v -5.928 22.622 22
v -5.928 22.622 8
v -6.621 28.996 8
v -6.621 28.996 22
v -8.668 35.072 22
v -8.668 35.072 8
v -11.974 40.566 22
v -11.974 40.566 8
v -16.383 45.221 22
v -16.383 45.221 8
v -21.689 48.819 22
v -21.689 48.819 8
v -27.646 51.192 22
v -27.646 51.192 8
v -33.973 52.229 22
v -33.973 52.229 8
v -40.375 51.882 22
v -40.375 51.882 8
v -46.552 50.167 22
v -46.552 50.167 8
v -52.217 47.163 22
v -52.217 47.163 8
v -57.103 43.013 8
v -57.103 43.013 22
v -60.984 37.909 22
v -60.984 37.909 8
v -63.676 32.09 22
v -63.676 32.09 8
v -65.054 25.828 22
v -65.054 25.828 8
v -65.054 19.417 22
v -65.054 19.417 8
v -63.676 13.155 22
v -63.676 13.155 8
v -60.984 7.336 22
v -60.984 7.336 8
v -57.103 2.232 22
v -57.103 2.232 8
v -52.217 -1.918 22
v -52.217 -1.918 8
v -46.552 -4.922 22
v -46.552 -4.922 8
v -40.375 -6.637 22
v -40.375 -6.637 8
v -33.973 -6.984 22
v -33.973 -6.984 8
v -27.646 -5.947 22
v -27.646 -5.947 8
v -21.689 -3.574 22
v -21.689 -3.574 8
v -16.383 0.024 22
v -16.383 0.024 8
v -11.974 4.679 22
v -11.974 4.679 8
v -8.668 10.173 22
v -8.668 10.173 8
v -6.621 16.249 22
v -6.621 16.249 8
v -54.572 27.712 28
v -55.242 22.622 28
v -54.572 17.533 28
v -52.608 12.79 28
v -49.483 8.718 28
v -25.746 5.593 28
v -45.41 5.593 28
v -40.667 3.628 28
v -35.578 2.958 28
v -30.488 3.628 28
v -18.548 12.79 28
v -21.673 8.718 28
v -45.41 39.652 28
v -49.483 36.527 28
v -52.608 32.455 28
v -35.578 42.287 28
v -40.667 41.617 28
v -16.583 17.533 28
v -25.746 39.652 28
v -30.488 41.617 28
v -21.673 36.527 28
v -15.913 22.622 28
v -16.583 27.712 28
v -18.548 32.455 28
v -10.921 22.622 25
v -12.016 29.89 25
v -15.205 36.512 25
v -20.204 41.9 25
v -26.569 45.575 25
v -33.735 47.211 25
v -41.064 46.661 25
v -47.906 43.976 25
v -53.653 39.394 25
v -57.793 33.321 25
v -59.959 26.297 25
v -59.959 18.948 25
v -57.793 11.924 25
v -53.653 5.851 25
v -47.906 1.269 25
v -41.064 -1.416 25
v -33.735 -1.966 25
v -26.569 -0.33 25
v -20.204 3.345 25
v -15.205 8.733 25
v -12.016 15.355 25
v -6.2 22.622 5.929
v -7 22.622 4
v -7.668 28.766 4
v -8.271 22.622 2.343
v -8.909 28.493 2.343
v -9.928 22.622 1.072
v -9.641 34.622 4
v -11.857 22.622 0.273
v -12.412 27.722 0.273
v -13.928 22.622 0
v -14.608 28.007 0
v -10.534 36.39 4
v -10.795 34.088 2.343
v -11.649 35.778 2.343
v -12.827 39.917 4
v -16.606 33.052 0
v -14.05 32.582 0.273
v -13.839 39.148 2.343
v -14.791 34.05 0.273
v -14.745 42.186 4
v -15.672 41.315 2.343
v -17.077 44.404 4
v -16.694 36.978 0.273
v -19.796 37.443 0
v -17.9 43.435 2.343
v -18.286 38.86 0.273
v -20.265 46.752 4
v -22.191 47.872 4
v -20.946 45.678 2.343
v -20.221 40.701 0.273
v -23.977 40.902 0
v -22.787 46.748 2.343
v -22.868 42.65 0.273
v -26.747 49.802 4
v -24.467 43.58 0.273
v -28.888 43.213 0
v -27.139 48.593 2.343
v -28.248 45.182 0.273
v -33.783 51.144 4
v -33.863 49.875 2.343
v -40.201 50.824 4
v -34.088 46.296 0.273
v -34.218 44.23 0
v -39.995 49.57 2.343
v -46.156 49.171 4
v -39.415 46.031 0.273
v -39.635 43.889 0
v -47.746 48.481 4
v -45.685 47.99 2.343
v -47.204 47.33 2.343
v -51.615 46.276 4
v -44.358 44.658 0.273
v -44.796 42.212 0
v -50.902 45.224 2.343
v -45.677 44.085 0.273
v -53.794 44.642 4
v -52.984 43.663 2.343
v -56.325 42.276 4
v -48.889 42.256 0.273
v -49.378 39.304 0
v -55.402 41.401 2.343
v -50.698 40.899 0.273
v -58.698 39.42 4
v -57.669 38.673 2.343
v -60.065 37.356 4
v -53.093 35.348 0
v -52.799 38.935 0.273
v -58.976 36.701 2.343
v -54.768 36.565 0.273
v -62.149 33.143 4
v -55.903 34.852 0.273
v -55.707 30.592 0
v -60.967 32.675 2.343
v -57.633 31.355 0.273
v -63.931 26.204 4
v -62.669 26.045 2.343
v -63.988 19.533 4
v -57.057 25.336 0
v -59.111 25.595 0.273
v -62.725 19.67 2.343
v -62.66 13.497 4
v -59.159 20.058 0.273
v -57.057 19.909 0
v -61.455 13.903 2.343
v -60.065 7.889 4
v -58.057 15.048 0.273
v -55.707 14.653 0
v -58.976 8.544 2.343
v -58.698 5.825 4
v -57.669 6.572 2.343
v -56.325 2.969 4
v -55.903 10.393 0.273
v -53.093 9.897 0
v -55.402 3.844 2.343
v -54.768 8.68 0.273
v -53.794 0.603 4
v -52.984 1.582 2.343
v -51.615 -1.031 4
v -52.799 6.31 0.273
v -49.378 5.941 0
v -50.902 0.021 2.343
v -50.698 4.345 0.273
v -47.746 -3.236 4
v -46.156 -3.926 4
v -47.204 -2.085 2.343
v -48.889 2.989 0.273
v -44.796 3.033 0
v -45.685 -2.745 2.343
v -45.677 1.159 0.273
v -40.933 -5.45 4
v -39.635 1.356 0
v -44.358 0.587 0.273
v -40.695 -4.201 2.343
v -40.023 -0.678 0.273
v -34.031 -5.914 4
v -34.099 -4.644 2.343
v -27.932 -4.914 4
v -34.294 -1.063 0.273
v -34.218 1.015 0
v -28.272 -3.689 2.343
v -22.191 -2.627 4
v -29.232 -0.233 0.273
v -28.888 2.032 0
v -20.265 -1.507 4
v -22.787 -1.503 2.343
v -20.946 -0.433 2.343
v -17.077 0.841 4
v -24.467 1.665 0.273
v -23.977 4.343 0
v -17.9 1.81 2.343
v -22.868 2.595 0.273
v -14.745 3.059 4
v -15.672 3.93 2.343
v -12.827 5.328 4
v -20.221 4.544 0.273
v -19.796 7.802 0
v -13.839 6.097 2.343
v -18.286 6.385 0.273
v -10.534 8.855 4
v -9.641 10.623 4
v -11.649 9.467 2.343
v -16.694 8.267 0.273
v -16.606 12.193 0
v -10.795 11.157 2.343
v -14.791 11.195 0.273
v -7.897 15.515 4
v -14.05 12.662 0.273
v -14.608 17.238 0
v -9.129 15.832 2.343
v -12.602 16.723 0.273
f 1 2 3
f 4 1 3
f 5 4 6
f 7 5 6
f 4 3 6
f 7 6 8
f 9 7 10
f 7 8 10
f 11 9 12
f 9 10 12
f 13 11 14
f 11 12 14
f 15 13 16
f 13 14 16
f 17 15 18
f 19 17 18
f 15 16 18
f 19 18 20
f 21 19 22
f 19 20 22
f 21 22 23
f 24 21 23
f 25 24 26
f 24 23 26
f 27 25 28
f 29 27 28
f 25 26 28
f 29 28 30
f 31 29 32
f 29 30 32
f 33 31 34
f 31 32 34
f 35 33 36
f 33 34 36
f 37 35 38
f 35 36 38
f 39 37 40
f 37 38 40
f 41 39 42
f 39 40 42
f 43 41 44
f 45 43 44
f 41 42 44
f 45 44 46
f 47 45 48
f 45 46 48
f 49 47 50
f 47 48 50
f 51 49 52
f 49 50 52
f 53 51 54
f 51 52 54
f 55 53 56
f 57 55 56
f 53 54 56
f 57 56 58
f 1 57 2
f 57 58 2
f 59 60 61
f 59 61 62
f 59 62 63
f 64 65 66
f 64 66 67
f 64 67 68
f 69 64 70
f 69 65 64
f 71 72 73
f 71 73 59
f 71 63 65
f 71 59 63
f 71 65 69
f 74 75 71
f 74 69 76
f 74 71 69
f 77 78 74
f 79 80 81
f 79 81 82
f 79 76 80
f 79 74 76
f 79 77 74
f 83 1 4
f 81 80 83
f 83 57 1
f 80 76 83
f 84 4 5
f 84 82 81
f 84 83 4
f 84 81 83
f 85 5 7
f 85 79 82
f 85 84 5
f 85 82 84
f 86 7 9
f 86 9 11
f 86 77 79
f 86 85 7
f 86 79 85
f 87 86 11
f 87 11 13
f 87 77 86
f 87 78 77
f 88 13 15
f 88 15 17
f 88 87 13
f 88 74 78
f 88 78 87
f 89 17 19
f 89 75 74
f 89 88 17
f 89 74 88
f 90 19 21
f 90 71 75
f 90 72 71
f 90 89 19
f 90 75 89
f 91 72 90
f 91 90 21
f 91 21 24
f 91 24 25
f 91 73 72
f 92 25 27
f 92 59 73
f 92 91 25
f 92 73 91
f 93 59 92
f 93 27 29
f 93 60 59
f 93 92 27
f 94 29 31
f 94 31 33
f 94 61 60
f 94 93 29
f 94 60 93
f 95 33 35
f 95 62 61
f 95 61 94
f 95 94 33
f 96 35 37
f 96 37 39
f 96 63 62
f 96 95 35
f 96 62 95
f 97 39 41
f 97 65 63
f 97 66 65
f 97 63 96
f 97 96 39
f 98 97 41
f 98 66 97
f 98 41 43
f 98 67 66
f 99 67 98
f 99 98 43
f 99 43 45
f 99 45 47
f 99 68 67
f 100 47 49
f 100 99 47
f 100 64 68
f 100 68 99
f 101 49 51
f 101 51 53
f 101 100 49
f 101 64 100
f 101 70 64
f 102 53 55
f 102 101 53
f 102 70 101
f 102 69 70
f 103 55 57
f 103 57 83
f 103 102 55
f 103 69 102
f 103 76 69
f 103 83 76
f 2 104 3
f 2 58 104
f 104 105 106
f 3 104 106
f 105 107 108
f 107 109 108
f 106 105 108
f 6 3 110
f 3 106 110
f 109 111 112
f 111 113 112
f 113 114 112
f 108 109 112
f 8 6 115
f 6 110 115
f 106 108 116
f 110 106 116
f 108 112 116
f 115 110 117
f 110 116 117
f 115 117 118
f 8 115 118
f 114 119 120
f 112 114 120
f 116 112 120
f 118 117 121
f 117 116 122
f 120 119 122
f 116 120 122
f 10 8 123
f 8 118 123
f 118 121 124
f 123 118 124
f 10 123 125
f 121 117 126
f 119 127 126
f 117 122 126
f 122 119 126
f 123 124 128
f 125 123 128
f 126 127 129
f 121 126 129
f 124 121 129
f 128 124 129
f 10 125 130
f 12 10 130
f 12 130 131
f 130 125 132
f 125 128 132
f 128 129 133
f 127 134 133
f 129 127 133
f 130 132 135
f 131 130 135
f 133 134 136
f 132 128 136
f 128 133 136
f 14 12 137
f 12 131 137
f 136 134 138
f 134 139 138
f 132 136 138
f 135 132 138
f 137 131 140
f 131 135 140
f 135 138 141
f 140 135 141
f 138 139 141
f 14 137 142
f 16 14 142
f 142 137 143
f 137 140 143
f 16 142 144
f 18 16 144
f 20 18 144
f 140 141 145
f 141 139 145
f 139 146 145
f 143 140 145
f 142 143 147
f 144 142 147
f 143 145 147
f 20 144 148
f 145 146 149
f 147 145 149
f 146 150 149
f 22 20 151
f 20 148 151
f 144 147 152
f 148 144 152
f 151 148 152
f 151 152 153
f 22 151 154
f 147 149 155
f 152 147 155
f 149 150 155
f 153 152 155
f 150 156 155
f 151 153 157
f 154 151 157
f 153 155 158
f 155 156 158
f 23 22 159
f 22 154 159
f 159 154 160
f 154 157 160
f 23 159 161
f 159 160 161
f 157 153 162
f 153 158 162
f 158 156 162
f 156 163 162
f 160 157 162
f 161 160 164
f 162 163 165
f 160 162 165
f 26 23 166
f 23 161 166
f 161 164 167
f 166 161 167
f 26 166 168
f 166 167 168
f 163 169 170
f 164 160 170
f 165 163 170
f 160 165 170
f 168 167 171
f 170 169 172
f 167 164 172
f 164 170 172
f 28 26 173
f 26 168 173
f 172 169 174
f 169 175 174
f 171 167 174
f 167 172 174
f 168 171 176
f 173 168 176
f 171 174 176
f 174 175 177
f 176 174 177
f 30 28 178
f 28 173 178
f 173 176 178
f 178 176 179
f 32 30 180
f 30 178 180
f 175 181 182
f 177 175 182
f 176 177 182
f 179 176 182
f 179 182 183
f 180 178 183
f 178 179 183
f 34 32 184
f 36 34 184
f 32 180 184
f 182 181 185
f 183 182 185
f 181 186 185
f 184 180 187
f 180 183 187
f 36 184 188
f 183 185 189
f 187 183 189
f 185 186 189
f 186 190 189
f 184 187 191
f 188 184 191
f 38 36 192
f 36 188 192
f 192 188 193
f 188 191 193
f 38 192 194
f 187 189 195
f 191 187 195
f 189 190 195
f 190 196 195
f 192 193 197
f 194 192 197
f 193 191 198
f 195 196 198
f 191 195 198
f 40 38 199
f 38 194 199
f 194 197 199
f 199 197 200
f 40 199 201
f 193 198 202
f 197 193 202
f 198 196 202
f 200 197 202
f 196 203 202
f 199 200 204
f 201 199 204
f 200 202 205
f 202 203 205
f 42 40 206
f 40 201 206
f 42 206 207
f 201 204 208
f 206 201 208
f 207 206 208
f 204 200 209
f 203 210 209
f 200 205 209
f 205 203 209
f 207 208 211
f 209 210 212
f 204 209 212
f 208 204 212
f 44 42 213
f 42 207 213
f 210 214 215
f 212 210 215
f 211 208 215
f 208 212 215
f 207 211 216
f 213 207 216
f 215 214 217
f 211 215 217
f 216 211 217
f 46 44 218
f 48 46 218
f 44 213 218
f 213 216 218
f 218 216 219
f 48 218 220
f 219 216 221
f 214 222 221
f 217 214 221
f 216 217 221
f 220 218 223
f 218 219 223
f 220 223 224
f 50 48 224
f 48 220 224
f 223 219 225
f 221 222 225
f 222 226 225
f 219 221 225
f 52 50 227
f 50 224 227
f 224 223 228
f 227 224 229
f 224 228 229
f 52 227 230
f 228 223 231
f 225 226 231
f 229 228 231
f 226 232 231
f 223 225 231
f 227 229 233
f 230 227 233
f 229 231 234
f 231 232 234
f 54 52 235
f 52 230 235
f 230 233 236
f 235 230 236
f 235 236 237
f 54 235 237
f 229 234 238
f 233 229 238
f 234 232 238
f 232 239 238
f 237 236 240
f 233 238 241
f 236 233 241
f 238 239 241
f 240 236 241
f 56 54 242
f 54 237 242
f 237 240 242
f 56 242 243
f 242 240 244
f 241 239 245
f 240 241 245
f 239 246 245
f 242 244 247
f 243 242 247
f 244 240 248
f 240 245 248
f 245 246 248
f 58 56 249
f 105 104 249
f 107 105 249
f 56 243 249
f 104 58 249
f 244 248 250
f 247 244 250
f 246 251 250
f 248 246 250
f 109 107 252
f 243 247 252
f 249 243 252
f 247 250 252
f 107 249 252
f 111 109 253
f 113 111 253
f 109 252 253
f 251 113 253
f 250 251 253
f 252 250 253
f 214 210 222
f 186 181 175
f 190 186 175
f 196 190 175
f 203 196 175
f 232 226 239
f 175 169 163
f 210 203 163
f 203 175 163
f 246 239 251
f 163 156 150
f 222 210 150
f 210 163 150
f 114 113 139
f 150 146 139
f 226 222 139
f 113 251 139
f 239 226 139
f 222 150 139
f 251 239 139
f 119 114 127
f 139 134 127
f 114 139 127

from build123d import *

# Parameters (mm, degrees)
SKETCH_1_R      = 29.65
EXTRUDE_1_DEPTH = 28
CHAMFER_1_SIZE  = 6
CHAMFER_1_SIZE2 = 9.985676894
FILLET_1_R      = 8


with BuildPart() as part:
    # 草图1 → 凸台-拉伸1 (new body)
    with BuildSketch(Plane.XY):
        with Locations((-35.577730584, 22.622481005)):
            Circle(SKETCH_1_R)
    extrude(amount=EXTRUDE_1_DEPTH)

    # 倒角1
    chamfer_1_edges = [part.edges().sort_by_distance(p)[0] for p in [
        (-65.227730584, 22.622481005, 28),
    ]]
    chamfer_1_side = [part.faces().sort_by_distance(p)[0] for p in [
        (-65.227730584, 22.622481005, 14),
    ]]
    chamfer(chamfer_1_edges, length=CHAMFER_1_SIZE, length2=CHAMFER_1_SIZE2, reference=chamfer_1_side[0])

    # 圆角1
    fillet_1_edges = [part.edges().sort_by_distance(p)[0] for p in [
        (-65.227730584, 22.622481005, 0),
    ]]
    fillet(fillet_1_edges, radius=FILLET_1_R)


solid = part.part
